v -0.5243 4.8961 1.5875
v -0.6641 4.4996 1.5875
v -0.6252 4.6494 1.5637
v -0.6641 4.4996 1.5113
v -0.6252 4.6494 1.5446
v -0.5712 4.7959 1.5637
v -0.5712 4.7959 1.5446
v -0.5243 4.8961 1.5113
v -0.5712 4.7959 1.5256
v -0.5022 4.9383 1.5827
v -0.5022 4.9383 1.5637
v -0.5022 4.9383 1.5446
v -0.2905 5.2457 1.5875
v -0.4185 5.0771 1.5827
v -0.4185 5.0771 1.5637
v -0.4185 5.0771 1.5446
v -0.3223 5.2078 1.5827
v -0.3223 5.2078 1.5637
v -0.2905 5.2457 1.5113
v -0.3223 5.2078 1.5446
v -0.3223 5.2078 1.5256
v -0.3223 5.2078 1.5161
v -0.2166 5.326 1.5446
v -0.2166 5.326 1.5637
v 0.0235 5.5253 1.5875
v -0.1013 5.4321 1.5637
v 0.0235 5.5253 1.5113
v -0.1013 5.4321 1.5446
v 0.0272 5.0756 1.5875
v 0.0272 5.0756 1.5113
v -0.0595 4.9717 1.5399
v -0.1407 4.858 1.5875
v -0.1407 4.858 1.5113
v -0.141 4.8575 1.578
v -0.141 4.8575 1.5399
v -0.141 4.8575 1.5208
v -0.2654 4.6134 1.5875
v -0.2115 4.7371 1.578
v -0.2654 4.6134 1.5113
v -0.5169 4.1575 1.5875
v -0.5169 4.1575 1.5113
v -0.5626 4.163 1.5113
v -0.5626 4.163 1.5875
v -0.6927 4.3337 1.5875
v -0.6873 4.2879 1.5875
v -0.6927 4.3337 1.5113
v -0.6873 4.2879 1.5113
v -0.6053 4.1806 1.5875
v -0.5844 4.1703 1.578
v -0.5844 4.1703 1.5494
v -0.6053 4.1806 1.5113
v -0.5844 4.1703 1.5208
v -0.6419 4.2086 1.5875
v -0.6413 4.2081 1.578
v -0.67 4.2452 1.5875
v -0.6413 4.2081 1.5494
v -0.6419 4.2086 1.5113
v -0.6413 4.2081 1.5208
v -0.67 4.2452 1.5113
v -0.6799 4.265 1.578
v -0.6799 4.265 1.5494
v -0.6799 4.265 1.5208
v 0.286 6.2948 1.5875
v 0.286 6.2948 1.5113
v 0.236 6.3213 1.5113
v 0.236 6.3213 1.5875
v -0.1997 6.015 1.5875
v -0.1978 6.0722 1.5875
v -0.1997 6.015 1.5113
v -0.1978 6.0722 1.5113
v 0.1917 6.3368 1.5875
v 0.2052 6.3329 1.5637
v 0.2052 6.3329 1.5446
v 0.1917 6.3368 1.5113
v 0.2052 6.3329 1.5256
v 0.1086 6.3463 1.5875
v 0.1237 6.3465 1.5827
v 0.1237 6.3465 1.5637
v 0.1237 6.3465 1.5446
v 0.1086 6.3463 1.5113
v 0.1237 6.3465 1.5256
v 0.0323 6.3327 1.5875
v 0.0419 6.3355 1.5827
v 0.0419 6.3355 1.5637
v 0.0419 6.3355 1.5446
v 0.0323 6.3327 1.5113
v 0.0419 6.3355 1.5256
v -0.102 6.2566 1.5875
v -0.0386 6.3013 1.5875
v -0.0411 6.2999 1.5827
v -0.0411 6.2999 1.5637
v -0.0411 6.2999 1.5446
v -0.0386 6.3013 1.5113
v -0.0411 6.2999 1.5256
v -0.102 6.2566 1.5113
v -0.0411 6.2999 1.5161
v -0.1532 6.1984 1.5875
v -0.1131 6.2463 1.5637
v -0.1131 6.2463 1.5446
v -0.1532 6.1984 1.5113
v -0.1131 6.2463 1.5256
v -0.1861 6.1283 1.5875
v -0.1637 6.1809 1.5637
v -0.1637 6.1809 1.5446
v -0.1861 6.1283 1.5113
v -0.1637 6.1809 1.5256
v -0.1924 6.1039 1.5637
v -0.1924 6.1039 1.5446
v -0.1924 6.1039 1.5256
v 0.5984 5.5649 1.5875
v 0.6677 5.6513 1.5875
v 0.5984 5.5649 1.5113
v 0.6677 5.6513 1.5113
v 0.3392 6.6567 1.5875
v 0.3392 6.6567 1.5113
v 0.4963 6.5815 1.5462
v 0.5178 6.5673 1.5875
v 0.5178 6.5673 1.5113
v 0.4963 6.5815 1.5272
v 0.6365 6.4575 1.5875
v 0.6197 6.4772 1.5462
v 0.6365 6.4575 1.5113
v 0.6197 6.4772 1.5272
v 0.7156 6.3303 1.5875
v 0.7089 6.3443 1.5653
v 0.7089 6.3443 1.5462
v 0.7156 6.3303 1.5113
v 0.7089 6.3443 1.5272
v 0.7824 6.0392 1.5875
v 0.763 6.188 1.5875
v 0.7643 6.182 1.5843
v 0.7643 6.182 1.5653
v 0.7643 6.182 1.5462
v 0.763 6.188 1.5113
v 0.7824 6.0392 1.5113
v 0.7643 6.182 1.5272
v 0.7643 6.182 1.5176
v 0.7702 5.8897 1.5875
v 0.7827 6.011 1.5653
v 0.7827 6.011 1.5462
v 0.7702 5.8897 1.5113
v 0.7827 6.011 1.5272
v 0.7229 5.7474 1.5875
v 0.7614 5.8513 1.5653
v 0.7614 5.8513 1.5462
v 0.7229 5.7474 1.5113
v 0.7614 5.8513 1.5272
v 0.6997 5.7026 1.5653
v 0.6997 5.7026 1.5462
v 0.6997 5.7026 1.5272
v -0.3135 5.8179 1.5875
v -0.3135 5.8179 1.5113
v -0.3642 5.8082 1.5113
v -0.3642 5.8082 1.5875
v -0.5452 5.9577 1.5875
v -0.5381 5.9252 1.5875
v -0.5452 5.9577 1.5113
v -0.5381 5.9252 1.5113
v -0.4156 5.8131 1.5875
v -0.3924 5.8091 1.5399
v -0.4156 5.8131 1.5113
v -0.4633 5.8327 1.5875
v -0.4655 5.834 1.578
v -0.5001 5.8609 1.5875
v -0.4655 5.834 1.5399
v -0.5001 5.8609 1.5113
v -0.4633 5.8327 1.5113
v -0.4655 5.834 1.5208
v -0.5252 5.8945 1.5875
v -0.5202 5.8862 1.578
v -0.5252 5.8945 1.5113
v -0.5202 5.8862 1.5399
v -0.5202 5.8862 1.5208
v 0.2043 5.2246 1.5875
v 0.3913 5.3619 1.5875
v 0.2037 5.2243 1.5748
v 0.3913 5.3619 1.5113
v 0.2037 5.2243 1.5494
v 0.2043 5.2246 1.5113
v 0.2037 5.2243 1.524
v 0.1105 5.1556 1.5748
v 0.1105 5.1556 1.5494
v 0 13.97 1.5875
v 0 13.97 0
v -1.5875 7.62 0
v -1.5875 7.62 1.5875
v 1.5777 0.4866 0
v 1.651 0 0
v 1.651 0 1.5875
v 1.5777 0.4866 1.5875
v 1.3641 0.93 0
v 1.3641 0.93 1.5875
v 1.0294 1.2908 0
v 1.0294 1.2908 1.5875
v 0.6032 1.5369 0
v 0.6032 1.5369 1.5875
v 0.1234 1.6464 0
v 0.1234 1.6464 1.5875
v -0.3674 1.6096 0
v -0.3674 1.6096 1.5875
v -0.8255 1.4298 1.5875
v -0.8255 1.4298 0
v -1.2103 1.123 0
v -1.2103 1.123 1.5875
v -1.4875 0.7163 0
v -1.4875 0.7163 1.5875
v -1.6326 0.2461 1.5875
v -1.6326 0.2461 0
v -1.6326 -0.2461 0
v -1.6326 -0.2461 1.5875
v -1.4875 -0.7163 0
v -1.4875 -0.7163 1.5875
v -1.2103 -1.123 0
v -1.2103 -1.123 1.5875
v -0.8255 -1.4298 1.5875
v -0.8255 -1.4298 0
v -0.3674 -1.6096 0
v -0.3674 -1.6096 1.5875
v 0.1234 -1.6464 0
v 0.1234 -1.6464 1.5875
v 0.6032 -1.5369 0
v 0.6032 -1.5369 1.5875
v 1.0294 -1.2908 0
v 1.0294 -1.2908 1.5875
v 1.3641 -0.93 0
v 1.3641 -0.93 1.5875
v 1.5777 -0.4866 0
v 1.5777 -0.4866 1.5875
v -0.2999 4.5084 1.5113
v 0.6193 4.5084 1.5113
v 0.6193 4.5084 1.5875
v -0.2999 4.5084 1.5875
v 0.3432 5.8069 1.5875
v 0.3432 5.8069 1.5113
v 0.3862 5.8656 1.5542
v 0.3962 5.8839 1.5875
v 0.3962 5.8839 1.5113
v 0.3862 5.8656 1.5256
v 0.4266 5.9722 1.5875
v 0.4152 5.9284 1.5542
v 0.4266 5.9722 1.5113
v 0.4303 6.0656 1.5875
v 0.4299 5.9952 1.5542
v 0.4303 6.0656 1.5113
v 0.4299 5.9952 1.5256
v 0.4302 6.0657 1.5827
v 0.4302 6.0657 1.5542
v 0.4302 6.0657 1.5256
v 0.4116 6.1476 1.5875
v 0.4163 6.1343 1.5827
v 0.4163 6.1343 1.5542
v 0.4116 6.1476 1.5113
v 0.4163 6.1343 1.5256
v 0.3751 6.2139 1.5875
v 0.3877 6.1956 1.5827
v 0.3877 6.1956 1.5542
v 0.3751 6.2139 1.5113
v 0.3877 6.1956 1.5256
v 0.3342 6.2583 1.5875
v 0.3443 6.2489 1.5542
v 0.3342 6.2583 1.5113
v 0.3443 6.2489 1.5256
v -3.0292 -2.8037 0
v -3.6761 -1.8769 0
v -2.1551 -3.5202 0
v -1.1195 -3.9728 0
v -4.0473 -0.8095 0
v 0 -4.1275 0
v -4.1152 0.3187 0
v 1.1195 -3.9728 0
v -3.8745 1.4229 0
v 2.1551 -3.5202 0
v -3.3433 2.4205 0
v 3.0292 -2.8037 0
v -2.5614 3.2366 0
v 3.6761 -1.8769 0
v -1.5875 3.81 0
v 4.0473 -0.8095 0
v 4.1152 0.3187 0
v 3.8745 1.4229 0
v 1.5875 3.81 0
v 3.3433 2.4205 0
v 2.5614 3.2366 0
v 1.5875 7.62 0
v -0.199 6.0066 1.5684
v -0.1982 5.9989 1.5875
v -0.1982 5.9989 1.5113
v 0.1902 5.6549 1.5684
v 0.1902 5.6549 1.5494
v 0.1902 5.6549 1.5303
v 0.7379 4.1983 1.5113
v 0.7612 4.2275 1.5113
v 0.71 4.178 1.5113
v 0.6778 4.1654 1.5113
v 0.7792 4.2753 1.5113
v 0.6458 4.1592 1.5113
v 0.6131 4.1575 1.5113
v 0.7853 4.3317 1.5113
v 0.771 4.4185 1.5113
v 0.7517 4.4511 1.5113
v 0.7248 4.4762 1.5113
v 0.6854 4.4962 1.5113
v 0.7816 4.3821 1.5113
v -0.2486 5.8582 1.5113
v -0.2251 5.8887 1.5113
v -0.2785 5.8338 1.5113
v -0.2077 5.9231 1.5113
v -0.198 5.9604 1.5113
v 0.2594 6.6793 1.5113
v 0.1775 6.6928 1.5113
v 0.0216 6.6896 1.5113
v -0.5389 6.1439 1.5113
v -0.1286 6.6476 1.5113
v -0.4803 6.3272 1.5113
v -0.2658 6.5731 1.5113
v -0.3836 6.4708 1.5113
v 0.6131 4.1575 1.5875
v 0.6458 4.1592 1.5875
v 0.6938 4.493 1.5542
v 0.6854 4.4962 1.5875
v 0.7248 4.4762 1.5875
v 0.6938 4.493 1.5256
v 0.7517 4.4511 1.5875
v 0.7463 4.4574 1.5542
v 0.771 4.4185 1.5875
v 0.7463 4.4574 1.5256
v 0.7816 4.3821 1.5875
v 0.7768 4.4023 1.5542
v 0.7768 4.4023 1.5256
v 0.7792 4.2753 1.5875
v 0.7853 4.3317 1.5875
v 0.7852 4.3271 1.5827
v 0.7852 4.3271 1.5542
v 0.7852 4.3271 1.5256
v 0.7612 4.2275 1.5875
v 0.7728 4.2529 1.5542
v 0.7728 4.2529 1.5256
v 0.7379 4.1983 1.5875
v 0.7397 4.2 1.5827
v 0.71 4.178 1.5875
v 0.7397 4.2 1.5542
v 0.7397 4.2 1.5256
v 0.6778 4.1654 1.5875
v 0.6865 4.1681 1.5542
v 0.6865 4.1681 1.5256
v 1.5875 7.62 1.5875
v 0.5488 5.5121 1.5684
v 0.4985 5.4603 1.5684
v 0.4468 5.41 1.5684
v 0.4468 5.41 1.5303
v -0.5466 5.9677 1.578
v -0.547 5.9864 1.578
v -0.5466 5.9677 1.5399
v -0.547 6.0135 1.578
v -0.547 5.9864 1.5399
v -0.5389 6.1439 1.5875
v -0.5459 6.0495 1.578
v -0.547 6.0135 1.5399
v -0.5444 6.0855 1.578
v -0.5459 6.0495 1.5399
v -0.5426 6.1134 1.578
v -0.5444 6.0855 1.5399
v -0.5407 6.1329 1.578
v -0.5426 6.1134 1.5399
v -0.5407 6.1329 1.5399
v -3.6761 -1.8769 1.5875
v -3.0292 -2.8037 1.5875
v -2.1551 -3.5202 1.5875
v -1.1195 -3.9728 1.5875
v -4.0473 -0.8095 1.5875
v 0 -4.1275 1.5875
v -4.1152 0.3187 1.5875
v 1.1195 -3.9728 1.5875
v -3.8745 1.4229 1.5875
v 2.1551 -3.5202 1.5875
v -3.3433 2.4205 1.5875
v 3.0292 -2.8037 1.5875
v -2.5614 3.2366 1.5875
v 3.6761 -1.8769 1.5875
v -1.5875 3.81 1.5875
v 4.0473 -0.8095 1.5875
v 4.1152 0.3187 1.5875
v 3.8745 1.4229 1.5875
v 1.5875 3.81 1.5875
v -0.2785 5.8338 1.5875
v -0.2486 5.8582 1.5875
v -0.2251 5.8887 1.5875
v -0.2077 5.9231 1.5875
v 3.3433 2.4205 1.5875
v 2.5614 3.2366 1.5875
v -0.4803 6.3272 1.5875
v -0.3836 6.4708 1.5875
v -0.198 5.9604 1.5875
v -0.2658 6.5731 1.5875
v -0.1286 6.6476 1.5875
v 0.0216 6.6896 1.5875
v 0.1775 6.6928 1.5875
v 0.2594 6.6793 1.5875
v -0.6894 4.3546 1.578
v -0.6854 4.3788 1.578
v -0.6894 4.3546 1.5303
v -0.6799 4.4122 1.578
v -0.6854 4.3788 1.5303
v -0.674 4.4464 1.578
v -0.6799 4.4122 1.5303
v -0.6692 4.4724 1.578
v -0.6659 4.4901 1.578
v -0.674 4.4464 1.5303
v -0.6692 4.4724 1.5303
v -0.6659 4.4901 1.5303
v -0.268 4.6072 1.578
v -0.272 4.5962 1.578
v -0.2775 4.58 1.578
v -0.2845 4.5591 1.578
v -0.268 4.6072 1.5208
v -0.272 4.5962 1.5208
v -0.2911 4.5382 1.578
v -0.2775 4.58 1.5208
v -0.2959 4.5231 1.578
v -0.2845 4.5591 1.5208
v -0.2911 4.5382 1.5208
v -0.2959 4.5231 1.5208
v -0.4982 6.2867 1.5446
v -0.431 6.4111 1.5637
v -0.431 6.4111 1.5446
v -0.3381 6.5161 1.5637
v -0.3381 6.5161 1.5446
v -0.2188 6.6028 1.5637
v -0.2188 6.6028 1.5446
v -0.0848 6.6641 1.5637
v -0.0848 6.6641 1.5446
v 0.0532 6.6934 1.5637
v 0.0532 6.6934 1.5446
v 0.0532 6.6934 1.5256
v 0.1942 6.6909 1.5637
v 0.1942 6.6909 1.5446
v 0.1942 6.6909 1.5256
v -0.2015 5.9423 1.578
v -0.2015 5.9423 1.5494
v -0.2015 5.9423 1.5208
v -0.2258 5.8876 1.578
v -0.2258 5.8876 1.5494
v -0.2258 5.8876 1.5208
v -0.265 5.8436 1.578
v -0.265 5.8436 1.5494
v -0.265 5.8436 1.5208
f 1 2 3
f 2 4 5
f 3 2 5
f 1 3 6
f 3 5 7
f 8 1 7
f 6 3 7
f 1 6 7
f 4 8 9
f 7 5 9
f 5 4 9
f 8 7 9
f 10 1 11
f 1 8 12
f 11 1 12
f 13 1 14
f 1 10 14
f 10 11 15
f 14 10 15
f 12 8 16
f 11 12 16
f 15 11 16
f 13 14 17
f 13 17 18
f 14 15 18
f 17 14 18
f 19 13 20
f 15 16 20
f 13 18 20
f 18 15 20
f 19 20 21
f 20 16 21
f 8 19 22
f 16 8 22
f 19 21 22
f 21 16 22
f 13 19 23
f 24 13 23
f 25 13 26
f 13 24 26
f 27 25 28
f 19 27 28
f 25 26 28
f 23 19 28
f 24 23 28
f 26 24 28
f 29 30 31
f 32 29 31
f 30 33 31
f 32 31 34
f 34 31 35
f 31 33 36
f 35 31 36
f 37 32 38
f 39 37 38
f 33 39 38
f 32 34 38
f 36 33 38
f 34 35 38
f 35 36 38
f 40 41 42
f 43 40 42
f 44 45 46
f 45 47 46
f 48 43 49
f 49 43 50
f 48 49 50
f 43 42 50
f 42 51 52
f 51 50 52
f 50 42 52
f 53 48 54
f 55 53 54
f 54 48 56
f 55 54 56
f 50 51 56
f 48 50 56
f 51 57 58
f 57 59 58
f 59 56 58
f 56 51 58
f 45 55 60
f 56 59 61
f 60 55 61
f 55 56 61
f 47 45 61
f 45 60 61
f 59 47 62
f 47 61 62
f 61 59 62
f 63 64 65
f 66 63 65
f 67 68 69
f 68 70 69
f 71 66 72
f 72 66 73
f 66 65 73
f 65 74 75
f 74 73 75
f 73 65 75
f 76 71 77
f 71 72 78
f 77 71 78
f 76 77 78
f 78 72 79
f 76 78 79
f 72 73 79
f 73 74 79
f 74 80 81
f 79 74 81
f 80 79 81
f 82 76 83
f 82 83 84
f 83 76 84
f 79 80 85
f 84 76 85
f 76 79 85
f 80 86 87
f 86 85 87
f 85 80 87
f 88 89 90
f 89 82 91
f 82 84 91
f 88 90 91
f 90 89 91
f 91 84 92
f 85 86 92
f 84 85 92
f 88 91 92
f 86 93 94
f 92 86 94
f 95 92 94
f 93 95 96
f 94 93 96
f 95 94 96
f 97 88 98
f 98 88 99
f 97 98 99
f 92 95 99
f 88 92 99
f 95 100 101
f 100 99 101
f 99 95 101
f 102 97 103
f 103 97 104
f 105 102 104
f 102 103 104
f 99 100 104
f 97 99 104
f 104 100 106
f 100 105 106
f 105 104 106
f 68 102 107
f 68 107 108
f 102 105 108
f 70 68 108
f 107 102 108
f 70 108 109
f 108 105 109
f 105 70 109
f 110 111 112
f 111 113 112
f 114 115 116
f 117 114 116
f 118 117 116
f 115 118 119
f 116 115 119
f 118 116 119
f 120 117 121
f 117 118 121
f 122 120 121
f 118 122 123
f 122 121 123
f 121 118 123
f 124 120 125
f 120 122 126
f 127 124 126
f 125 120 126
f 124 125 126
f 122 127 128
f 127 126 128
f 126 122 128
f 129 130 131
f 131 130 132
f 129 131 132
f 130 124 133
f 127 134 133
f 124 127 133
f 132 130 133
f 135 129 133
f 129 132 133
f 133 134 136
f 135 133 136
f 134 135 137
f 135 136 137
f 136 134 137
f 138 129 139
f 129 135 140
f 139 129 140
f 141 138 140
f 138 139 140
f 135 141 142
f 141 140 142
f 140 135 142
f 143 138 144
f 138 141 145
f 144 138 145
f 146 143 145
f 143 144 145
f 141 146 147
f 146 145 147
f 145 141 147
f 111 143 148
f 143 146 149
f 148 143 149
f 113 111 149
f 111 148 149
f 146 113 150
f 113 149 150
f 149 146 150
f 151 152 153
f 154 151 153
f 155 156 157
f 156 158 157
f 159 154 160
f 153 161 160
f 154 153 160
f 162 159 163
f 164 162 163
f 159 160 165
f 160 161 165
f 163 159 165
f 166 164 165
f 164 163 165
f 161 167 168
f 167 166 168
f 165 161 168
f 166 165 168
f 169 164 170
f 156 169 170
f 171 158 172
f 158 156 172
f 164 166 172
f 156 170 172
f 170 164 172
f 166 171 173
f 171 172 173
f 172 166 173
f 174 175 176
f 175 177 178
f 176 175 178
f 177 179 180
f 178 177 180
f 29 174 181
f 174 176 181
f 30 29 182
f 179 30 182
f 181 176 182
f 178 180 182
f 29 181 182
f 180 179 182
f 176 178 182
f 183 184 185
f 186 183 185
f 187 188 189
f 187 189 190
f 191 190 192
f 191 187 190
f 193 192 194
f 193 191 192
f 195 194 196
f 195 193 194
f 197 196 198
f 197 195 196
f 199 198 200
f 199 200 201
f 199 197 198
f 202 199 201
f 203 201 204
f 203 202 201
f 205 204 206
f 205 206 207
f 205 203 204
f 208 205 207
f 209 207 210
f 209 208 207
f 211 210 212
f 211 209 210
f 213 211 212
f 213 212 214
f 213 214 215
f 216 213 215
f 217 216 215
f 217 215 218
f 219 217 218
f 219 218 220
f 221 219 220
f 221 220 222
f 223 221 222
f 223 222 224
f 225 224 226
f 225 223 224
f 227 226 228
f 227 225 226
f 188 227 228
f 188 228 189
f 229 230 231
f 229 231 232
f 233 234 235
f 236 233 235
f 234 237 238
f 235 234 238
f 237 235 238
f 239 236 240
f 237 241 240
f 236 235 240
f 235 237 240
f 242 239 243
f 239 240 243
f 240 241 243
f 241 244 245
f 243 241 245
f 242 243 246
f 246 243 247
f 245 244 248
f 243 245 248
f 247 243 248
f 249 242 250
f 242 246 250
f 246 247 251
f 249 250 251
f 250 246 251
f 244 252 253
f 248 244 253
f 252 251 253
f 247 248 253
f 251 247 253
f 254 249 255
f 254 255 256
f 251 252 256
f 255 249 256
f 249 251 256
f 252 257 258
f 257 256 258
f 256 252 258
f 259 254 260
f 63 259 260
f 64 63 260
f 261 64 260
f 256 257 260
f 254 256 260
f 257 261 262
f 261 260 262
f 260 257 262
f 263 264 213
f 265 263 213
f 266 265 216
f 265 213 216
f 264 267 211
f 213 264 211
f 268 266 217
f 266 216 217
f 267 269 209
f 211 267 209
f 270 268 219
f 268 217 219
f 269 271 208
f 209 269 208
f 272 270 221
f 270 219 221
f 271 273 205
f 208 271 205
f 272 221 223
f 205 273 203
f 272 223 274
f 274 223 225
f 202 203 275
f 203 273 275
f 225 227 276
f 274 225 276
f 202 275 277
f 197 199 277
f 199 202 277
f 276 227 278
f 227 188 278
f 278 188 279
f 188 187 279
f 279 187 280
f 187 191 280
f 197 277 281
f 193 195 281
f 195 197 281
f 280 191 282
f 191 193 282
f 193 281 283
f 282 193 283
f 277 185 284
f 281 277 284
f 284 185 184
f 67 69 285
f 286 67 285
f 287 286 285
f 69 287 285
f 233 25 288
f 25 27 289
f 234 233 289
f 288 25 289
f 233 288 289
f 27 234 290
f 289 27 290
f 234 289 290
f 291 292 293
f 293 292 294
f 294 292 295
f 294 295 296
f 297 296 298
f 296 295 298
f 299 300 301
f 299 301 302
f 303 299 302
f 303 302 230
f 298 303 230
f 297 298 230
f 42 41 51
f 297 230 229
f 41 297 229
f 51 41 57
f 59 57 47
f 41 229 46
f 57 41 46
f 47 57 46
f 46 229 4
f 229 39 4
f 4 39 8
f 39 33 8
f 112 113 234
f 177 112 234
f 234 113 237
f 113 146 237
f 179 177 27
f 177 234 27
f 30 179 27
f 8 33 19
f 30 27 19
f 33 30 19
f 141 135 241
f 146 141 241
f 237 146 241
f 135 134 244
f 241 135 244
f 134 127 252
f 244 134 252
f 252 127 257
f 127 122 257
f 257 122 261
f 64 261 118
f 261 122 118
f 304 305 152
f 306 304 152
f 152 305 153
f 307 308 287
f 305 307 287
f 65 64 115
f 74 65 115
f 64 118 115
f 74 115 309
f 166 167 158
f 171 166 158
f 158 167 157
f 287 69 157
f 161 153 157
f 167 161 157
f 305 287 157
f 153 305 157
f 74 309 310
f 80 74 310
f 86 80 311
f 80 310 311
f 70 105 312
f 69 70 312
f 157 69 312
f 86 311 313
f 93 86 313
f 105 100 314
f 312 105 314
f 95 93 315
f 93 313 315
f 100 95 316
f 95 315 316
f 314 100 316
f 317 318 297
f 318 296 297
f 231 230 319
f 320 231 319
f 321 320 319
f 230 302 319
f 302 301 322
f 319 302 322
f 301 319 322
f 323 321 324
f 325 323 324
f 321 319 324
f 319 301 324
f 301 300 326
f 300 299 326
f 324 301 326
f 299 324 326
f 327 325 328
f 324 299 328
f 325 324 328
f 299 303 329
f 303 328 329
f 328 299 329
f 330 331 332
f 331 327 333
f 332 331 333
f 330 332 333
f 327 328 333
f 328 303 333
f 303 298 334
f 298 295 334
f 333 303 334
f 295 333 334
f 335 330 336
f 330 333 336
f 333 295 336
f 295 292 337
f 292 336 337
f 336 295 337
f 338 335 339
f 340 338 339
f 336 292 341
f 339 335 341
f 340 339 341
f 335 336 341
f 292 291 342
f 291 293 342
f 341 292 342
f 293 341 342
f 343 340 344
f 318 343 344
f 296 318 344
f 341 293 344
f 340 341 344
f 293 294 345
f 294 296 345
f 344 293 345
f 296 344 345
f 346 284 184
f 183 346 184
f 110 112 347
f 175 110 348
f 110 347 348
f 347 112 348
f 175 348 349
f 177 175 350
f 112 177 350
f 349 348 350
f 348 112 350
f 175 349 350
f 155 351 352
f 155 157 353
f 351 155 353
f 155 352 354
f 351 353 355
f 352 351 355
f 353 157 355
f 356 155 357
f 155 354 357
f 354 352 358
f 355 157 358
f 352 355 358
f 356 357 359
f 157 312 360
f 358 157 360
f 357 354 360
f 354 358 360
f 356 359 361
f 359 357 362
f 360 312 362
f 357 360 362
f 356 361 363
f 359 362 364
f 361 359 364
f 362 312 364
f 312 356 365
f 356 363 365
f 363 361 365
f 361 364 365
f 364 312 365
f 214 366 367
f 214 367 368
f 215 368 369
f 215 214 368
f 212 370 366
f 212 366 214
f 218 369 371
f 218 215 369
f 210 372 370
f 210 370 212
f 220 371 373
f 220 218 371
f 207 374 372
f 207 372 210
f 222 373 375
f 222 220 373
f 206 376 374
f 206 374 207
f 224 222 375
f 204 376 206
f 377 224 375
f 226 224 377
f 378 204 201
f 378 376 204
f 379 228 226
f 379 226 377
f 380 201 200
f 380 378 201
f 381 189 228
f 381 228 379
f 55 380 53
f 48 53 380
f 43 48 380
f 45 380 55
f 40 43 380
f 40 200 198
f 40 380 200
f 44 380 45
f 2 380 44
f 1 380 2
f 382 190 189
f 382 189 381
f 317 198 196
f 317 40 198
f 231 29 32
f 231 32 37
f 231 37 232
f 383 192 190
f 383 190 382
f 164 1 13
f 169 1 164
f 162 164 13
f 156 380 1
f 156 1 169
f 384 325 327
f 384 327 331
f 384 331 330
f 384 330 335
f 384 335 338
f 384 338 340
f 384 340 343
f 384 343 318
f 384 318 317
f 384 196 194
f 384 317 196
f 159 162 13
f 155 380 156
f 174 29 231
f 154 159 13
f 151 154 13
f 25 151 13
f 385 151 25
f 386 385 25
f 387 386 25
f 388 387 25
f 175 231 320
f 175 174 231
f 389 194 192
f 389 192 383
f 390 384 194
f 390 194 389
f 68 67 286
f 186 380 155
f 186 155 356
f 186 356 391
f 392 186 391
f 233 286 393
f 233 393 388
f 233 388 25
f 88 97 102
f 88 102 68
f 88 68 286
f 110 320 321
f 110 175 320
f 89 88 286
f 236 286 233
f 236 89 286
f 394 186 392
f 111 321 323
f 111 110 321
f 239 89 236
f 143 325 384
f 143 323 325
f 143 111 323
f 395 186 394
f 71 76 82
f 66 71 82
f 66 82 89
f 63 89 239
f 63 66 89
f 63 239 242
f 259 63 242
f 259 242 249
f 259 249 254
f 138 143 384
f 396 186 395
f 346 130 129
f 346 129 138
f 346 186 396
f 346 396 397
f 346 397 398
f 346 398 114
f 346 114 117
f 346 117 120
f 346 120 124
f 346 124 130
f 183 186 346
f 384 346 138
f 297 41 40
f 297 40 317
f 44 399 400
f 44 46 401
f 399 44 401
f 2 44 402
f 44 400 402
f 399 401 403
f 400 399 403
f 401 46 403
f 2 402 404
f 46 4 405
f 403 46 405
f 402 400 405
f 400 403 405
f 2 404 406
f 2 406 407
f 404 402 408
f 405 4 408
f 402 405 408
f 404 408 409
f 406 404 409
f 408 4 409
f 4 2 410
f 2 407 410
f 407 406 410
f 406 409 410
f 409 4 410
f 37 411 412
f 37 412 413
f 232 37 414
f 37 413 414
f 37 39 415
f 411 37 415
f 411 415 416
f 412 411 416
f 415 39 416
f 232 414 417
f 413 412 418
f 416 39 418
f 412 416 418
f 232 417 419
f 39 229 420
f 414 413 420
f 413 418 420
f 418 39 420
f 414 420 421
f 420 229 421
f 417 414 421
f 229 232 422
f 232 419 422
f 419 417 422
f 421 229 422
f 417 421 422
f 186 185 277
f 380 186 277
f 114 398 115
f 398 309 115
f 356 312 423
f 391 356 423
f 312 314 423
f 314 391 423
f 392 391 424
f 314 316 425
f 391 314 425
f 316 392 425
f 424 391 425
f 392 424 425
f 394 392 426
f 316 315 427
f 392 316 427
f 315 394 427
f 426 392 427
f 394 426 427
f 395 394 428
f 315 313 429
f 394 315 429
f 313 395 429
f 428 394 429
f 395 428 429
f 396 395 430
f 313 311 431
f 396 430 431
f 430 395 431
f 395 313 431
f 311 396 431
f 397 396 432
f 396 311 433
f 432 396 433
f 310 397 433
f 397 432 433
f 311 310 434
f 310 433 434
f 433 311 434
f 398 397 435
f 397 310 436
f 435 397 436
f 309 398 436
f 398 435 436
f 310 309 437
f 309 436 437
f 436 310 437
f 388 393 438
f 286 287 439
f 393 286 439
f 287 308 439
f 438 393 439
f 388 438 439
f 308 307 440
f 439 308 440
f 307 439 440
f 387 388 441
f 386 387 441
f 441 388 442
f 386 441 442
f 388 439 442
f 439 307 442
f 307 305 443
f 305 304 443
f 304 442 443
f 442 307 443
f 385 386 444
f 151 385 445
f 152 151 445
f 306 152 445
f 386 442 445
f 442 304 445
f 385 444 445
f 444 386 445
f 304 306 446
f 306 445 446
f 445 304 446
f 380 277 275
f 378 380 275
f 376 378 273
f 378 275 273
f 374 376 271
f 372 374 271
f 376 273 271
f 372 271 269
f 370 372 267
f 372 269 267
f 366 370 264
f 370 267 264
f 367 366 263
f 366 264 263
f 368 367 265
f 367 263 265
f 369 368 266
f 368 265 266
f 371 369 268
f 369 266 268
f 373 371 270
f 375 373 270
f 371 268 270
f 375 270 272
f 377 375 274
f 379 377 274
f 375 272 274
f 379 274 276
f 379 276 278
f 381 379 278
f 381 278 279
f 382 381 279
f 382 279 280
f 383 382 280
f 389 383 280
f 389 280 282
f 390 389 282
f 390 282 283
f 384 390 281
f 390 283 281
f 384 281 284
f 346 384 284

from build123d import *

# Parameters (mm, degrees)
SKETCH1_R           = 1.651
BOSS_EXTRUDE1_DEPTH = 1.5875
WRAP1_START         = -0.0762
WRAP1_DEPTH         = 0.0762


# Read off the part's stored shape, not the designer's step: Wrap1
with BuildPart() as part:
    # Sketch1 → Boss-Extrude1 (new body)
    with BuildSketch(Plane.XY):
        with BuildLine():
            Line((1.5875, 3.81), (1.5875, 7.62))
            Line((1.5875, 7.62), (0, 13.97))
            Line((0, 13.97), (-1.5875, 7.62))
            Line((-1.5875, 7.62), (-1.5875, 3.81))
            ThreePointArc((-1.5875, 3.81), (0, -4.1275), (1.5875, 3.81))
        make_face()
        Circle(SKETCH1_R, mode=Mode.SUBTRACT)
    extrude(amount=BOSS_EXTRUDE1_DEPTH)

    # Wrap1 outline → Wrap1 (cut)
    with BuildSketch(Plane.XY.offset(1.5875).offset(WRAP1_START)):
        with BuildLine():
            add(Edge.make_bspline(
                [(-0.6927271, 4.333675895), (-0.692495741, 4.33563577), (-0.691667591, 4.342651153), (-0.688769042, 4.357634786), (-0.684922586, 4.381892615), (-0.67986008, 4.412498716), (-0.674554045, 4.443717389), (-0.669757497, 4.46963377), (-0.666454834, 4.487377562), (-0.664707266, 4.496426288), (-0.664092904, 4.499607388)],
                knots=[0, 0, 0, 0, 0.035151439, 0.125824754, 0.271689381, 0.472746348, 0.678464873, 0.835817972, 0.942281445, 1, 1, 1, 1], degree=3))
            add(Edge.make_bspline(
                [(-0.51688377, 4.15746546), (-0.528701611, 4.158083472), (-0.551766092, 4.159289625), (-0.584872692, 4.169297645), (-0.615121792, 4.185426226), (-0.642244185, 4.207325789), (-0.664332359, 4.234330011), (-0.681129984, 4.264680596), (-0.690817492, 4.298344301), (-0.69208232, 4.321746179), (-0.6927271, 4.333675895)],
                knots=[0, 0, 0, 0, 0.127822844, 0.24946752, 0.37103994, 0.497334401, 0.624467945, 0.746667569, 0.870857209, 1, 1, 1, 1], degree=3))
            Line((-0.51688377, 4.15746546), (0.613065645, 4.15746546))
            add(Edge.make_bspline(
                [(0.619306431, 4.50841791), (0.632717748, 4.507153173), (0.658098658, 4.50475966), (0.693273978, 4.494445608), (0.722975165, 4.478932226), (0.747198284, 4.458294651), (0.765727881, 4.432501536), (0.778201608, 4.401557742), (0.784922795, 4.365808024), (0.785968558, 4.327125755), (0.782797594, 4.288646449), (0.774105079, 4.253571852), (0.760372999, 4.223441901), (0.740443682, 4.199291643), (0.716043821, 4.179781436), (0.685855522, 4.166902638), (0.65108202, 4.158569199), (0.62621445, 4.157847212), (0.613065645, 4.15746546)],
                knots=[0, 0, 0, 0, 0.072730168, 0.137641809, 0.196854627, 0.25270236, 0.308172367, 0.366921054, 0.43168746, 0.503873594, 0.5756551, 0.639861159, 0.698475495, 0.753049963, 0.807728666, 0.865787403, 0.929034673, 1, 1, 1, 1], degree=3))
            Line((0.619306431, 4.50841791), (-0.299924672, 4.50841791))
            add(Edge.make_bspline(
                [(-0.265416795, 4.61340996), (-0.266287441, 4.611335244), (-0.268671287, 4.605654632), (-0.272648022, 4.594488112), (-0.278056178, 4.578425355), (-0.284599105, 4.559148006), (-0.290437621, 4.540090467), (-0.295453112, 4.524748532), (-0.298353833, 4.514818948), (-0.299563911, 4.509887977), (-0.299924672, 4.50841791)],
                knots=[0, 0, 0, 0, 0.061041746, 0.16713346, 0.321479673, 0.520970162, 0.719435699, 0.862244331, 0.958930983, 1, 1, 1, 1], degree=3))
            add(Edge.make_bspline(
                [(0.027165948, 5.075595247), (0.012329066, 5.058837564), (-0.017572968, 5.025064378), (-0.06002472, 4.971553167), (-0.101552202, 4.915829097), (-0.141371923, 4.857947546), (-0.178311252, 4.798326659), (-0.211983981, 4.737785905), (-0.241000061, 4.676139025), (-0.257329382, 4.634187343), (-0.265416795, 4.61340996)],
                knots=[0, 0, 0, 0, 0.12202016, 0.245917621, 0.372291213, 0.500915216, 0.628859031, 0.754584526, 0.878453238, 1, 1, 1, 1], degree=3))
            add(Edge.make_bspline(
                [(0.391334181, 5.361937204), (0.361223865, 5.337586417), (0.300850401, 5.288761242), (0.219924135, 5.235074247), (0.155397551, 5.192066323), (0.110122794, 5.155965467), (0.066910538, 5.117642292), (0.040427943, 5.089625526), (0.027165948, 5.075595247)],
                knots=[0, 0, 0, 0, 0.250087632, 0.501444657, 0.627123169, 0.750990091, 0.875300439, 1, 1, 1, 1], degree=3))
            add(Edge.make_bspline(
                [(0.598381442, 5.56494631), (0.581926642, 5.547262699), (0.549082849, 5.511966198), (0.49868679, 5.460177761), (0.447122843, 5.409034831), (0.410033576, 5.377723514), (0.391334181, 5.361937204)],
                knots=[0, 0, 0, 0, 0.249702456, 0.49840631, 0.747110164, 1, 1, 1, 1], degree=3))
            add(Edge.make_bspline(
                [(0.33920526, 6.656716797), (0.353472465, 6.651511564), (0.381587775, 6.641254003), (0.421878928, 6.623018524), (0.46040127, 6.60379966), (0.496246373, 6.581804576), (0.530707302, 6.55893057), (0.562434404, 6.533414044), (0.592544673, 6.506642148), (0.619896671, 6.477556983), (0.645403722, 6.446910926), (0.668952012, 6.414618565), (0.690309115, 6.380391375), (0.709306159, 6.344213139), (0.726787061, 6.306508462), (0.741234339, 6.266585002), (0.754241409, 6.22511982), (0.768072724, 6.168006218), (0.780178454, 6.096569678), (0.784368607, 6.011894186), (0.778401012, 5.930079625), (0.763237068, 5.850700165), (0.736754159, 5.774454593), (0.700650258, 5.70108113), (0.65499011, 5.630171698), (0.617543834, 5.587025516), (0.598381442, 5.56494631)],
                knots=[0, 0, 0, 0, 0.034109449, 0.067216932, 0.099308832, 0.130758354, 0.161641564, 0.192170293, 0.22214936, 0.252098155, 0.281773115, 0.311689081, 0.341822813, 0.372324293, 0.403451297, 0.435115199, 0.467638762, 0.501046257, 0.567081754, 0.630114049, 0.691033314, 0.750991448, 0.811157234, 0.871775484, 0.934383635, 1, 1, 1, 1], degree=3))
            add(Edge.make_bspline(
                [(-0.538910074, 6.14387101), (-0.533666781, 6.168600667), (-0.523379004, 6.217122316), (-0.49947922, 6.286622214), (-0.46952229, 6.351736346), (-0.432141963, 6.411594101), (-0.388817022, 6.467103624), (-0.338443531, 6.517468922), (-0.281818221, 6.563499117), (-0.219357577, 6.603751762), (-0.153537671, 6.638071584), (-0.085716569, 6.665195555), (-0.016745257, 6.684019917), (0.053090433, 6.694810558), (0.123668827, 6.69725602), (0.195052802, 6.69205738), (0.26744334, 6.678845403), (0.314983363, 6.664185895), (0.33920526, 6.656716797)],
                knots=[0, 0, 0, 0, 0.065457993, 0.128434036, 0.190005232, 0.250812254, 0.310887235, 0.372102182, 0.434999136, 0.499647143, 0.564322364, 0.62709449, 0.688559438, 0.749194229, 0.80980248, 0.871165092, 0.934357921, 1, 1, 1, 1], degree=3))
            add(Edge.make_bspline(
                [(-0.54515086, 5.957748738), (-0.545718168, 5.961046078), (-0.547345693, 5.970505669), (-0.546773291, 5.989222056), (-0.547292664, 6.016483915), (-0.545797464, 6.049530152), (-0.544775877, 6.082836829), (-0.54278109, 6.110594522), (-0.541383604, 6.130127097), (-0.539569617, 6.140206325), (-0.538910074, 6.14387101)],
                knots=[0, 0, 0, 0, 0.053703755, 0.154068263, 0.299667211, 0.492577764, 0.685558541, 0.835415856, 0.940159201, 1, 1, 1, 1], degree=3))
            add(Edge.make_bspline(
                [(-0.313507559, 5.817881705), (-0.326748688, 5.814308009), (-0.352565283, 5.807340274), (-0.392277197, 5.807775651), (-0.430582168, 5.815853055), (-0.465914446, 5.832877527), (-0.497319983, 5.855880409), (-0.521377363, 5.885403501), (-0.538261794, 5.91971928), (-0.542813227, 5.944844385), (-0.54515086, 5.957748738)],
                knots=[0, 0, 0, 0, 0.132186122, 0.257726952, 0.380150903, 0.508367113, 0.634381904, 0.753877808, 0.873590673, 1, 1, 1, 1], degree=3))
            add(Edge.make_bspline(
                [(-0.198236566, 5.998864506), (-0.197479077, 5.989433957), (-0.195955535, 5.970466259), (-0.200815888, 5.941934255), (-0.210542191, 5.913916125), (-0.225203232, 5.887363551), (-0.242888924, 5.862861999), (-0.264463419, 5.843302102), (-0.287482268, 5.827105268), (-0.304880803, 5.820939094), (-0.313507559, 5.817881705)],
                knots=[0, 0, 0, 0, 0.122295461, 0.245973298, 0.371951377, 0.505452265, 0.638129912, 0.761654916, 0.881820808, 1, 1, 1, 1], degree=3))
            add(Edge.make_bspline(
                [(-0.199704987, 6.015017129), (-0.199566206, 6.013672938), (-0.199276128, 6.010863318), (-0.199164855, 6.006656873), (-0.198039254, 6.00269879), (-0.198173285, 6.000094218), (-0.198236566, 5.998864506)],
                knots=[0, 0, 0, 0, 0.249515153, 0.521535263, 0.774099595, 1, 1, 1, 1], degree=3))
            add(Edge.make_bspline(
                [(0.285975025, 6.294751195), (0.272682151, 6.302411025), (0.246820565, 6.317313396), (0.206070499, 6.333889959), (0.164895436, 6.343180125), (0.123783852, 6.347764309), (0.082451701, 6.344774208), (0.040930466, 6.336302375), (-0.000789689, 6.321390173), (-0.041463496, 6.300532784), (-0.079886926, 6.276014174), (-0.113287346, 6.247194805), (-0.142021611, 6.216160745), (-0.164514541, 6.181366891), (-0.182237478, 6.144073312), (-0.193171755, 6.103402582), (-0.200370718, 6.060183865), (-0.199930896, 6.03034404), (-0.199704987, 6.015017129)],
                knots=[0, 0, 0, 0, 0.066639456, 0.12964856, 0.190280739, 0.249604232, 0.308755828, 0.369565023, 0.433317181, 0.500628138, 0.567894957, 0.630888346, 0.691885636, 0.751037232, 0.810284388, 0.870553939, 0.933511396, 1, 1, 1, 1], degree=3))
            add(Edge.make_bspline(
                [(0.343243416, 5.806868553), (0.351118523, 5.816407152), (0.366580785, 5.835135574), (0.386597777, 5.865012057), (0.402782369, 5.896097243), (0.415819128, 5.928119207), (0.424960671, 5.961266887), (0.430570708, 5.995358807), (0.432217895, 6.030307207), (0.430871446, 6.06572163), (0.425827166, 6.10070134), (0.417013572, 6.134350041), (0.404442271, 6.166146407), (0.388279505, 6.196056065), (0.368152112, 6.223808343), (0.34445221, 6.249741409), (0.316833874, 6.273573162), (0.296395252, 6.287599927), (0.285975025, 6.294751195)],
                knots=[0, 0, 0, 0, 0.065983685, 0.129554698, 0.191477678, 0.252715103, 0.313711813, 0.374582555, 0.43670492, 0.500101288, 0.563453918, 0.624910304, 0.685299263, 0.74549372, 0.805843828, 0.867780579, 0.932590547, 1, 1, 1, 1], degree=3))
            add(Edge.make_bspline(
                [(0.023494898, 5.525298962), (0.053077007, 5.546024218), (0.110773274, 5.586446284), (0.191248753, 5.654420756), (0.268021717, 5.7279068), (0.317633659, 5.779985467), (0.343243416, 5.806868553)],
                knots=[0, 0, 0, 0, 0.25365197, 0.494716981, 0.739172156, 1, 1, 1, 1], degree=3))
            add(Edge.make_bspline(
                [(-0.664092904, 4.499607388), (-0.658464763, 4.524753093), (-0.647193012, 4.575113612), (-0.625796845, 4.649765684), (-0.600307799, 4.723379254), (-0.571857224, 4.796338257), (-0.538895385, 4.867967849), (-0.502663605, 4.938847518), (-0.462420857, 5.008682301), (-0.419106564, 5.077470685), (-0.372126214, 5.143890883), (-0.323106184, 5.207984837), (-0.27111994, 5.26850968), (-0.217145112, 5.326365759), (-0.160639031, 5.380988853), (-0.101805622, 5.43256559), (-0.040448995, 5.480747144), (0.002179636, 5.510447916), (0.023494898, 5.525298962)],
                knots=[0, 0, 0, 0, 0.061108243, 0.122384435, 0.184064158, 0.245829863, 0.308042655, 0.37099844, 0.434574042, 0.499151414, 0.563730742, 0.627472417, 0.690465657, 0.752889321, 0.815082475, 0.876788142, 0.938391336, 1, 1, 1, 1], degree=3))
        make_face()
    extrude(amount=WRAP1_DEPTH, mode=Mode.SUBTRACT)


solid = part.part
